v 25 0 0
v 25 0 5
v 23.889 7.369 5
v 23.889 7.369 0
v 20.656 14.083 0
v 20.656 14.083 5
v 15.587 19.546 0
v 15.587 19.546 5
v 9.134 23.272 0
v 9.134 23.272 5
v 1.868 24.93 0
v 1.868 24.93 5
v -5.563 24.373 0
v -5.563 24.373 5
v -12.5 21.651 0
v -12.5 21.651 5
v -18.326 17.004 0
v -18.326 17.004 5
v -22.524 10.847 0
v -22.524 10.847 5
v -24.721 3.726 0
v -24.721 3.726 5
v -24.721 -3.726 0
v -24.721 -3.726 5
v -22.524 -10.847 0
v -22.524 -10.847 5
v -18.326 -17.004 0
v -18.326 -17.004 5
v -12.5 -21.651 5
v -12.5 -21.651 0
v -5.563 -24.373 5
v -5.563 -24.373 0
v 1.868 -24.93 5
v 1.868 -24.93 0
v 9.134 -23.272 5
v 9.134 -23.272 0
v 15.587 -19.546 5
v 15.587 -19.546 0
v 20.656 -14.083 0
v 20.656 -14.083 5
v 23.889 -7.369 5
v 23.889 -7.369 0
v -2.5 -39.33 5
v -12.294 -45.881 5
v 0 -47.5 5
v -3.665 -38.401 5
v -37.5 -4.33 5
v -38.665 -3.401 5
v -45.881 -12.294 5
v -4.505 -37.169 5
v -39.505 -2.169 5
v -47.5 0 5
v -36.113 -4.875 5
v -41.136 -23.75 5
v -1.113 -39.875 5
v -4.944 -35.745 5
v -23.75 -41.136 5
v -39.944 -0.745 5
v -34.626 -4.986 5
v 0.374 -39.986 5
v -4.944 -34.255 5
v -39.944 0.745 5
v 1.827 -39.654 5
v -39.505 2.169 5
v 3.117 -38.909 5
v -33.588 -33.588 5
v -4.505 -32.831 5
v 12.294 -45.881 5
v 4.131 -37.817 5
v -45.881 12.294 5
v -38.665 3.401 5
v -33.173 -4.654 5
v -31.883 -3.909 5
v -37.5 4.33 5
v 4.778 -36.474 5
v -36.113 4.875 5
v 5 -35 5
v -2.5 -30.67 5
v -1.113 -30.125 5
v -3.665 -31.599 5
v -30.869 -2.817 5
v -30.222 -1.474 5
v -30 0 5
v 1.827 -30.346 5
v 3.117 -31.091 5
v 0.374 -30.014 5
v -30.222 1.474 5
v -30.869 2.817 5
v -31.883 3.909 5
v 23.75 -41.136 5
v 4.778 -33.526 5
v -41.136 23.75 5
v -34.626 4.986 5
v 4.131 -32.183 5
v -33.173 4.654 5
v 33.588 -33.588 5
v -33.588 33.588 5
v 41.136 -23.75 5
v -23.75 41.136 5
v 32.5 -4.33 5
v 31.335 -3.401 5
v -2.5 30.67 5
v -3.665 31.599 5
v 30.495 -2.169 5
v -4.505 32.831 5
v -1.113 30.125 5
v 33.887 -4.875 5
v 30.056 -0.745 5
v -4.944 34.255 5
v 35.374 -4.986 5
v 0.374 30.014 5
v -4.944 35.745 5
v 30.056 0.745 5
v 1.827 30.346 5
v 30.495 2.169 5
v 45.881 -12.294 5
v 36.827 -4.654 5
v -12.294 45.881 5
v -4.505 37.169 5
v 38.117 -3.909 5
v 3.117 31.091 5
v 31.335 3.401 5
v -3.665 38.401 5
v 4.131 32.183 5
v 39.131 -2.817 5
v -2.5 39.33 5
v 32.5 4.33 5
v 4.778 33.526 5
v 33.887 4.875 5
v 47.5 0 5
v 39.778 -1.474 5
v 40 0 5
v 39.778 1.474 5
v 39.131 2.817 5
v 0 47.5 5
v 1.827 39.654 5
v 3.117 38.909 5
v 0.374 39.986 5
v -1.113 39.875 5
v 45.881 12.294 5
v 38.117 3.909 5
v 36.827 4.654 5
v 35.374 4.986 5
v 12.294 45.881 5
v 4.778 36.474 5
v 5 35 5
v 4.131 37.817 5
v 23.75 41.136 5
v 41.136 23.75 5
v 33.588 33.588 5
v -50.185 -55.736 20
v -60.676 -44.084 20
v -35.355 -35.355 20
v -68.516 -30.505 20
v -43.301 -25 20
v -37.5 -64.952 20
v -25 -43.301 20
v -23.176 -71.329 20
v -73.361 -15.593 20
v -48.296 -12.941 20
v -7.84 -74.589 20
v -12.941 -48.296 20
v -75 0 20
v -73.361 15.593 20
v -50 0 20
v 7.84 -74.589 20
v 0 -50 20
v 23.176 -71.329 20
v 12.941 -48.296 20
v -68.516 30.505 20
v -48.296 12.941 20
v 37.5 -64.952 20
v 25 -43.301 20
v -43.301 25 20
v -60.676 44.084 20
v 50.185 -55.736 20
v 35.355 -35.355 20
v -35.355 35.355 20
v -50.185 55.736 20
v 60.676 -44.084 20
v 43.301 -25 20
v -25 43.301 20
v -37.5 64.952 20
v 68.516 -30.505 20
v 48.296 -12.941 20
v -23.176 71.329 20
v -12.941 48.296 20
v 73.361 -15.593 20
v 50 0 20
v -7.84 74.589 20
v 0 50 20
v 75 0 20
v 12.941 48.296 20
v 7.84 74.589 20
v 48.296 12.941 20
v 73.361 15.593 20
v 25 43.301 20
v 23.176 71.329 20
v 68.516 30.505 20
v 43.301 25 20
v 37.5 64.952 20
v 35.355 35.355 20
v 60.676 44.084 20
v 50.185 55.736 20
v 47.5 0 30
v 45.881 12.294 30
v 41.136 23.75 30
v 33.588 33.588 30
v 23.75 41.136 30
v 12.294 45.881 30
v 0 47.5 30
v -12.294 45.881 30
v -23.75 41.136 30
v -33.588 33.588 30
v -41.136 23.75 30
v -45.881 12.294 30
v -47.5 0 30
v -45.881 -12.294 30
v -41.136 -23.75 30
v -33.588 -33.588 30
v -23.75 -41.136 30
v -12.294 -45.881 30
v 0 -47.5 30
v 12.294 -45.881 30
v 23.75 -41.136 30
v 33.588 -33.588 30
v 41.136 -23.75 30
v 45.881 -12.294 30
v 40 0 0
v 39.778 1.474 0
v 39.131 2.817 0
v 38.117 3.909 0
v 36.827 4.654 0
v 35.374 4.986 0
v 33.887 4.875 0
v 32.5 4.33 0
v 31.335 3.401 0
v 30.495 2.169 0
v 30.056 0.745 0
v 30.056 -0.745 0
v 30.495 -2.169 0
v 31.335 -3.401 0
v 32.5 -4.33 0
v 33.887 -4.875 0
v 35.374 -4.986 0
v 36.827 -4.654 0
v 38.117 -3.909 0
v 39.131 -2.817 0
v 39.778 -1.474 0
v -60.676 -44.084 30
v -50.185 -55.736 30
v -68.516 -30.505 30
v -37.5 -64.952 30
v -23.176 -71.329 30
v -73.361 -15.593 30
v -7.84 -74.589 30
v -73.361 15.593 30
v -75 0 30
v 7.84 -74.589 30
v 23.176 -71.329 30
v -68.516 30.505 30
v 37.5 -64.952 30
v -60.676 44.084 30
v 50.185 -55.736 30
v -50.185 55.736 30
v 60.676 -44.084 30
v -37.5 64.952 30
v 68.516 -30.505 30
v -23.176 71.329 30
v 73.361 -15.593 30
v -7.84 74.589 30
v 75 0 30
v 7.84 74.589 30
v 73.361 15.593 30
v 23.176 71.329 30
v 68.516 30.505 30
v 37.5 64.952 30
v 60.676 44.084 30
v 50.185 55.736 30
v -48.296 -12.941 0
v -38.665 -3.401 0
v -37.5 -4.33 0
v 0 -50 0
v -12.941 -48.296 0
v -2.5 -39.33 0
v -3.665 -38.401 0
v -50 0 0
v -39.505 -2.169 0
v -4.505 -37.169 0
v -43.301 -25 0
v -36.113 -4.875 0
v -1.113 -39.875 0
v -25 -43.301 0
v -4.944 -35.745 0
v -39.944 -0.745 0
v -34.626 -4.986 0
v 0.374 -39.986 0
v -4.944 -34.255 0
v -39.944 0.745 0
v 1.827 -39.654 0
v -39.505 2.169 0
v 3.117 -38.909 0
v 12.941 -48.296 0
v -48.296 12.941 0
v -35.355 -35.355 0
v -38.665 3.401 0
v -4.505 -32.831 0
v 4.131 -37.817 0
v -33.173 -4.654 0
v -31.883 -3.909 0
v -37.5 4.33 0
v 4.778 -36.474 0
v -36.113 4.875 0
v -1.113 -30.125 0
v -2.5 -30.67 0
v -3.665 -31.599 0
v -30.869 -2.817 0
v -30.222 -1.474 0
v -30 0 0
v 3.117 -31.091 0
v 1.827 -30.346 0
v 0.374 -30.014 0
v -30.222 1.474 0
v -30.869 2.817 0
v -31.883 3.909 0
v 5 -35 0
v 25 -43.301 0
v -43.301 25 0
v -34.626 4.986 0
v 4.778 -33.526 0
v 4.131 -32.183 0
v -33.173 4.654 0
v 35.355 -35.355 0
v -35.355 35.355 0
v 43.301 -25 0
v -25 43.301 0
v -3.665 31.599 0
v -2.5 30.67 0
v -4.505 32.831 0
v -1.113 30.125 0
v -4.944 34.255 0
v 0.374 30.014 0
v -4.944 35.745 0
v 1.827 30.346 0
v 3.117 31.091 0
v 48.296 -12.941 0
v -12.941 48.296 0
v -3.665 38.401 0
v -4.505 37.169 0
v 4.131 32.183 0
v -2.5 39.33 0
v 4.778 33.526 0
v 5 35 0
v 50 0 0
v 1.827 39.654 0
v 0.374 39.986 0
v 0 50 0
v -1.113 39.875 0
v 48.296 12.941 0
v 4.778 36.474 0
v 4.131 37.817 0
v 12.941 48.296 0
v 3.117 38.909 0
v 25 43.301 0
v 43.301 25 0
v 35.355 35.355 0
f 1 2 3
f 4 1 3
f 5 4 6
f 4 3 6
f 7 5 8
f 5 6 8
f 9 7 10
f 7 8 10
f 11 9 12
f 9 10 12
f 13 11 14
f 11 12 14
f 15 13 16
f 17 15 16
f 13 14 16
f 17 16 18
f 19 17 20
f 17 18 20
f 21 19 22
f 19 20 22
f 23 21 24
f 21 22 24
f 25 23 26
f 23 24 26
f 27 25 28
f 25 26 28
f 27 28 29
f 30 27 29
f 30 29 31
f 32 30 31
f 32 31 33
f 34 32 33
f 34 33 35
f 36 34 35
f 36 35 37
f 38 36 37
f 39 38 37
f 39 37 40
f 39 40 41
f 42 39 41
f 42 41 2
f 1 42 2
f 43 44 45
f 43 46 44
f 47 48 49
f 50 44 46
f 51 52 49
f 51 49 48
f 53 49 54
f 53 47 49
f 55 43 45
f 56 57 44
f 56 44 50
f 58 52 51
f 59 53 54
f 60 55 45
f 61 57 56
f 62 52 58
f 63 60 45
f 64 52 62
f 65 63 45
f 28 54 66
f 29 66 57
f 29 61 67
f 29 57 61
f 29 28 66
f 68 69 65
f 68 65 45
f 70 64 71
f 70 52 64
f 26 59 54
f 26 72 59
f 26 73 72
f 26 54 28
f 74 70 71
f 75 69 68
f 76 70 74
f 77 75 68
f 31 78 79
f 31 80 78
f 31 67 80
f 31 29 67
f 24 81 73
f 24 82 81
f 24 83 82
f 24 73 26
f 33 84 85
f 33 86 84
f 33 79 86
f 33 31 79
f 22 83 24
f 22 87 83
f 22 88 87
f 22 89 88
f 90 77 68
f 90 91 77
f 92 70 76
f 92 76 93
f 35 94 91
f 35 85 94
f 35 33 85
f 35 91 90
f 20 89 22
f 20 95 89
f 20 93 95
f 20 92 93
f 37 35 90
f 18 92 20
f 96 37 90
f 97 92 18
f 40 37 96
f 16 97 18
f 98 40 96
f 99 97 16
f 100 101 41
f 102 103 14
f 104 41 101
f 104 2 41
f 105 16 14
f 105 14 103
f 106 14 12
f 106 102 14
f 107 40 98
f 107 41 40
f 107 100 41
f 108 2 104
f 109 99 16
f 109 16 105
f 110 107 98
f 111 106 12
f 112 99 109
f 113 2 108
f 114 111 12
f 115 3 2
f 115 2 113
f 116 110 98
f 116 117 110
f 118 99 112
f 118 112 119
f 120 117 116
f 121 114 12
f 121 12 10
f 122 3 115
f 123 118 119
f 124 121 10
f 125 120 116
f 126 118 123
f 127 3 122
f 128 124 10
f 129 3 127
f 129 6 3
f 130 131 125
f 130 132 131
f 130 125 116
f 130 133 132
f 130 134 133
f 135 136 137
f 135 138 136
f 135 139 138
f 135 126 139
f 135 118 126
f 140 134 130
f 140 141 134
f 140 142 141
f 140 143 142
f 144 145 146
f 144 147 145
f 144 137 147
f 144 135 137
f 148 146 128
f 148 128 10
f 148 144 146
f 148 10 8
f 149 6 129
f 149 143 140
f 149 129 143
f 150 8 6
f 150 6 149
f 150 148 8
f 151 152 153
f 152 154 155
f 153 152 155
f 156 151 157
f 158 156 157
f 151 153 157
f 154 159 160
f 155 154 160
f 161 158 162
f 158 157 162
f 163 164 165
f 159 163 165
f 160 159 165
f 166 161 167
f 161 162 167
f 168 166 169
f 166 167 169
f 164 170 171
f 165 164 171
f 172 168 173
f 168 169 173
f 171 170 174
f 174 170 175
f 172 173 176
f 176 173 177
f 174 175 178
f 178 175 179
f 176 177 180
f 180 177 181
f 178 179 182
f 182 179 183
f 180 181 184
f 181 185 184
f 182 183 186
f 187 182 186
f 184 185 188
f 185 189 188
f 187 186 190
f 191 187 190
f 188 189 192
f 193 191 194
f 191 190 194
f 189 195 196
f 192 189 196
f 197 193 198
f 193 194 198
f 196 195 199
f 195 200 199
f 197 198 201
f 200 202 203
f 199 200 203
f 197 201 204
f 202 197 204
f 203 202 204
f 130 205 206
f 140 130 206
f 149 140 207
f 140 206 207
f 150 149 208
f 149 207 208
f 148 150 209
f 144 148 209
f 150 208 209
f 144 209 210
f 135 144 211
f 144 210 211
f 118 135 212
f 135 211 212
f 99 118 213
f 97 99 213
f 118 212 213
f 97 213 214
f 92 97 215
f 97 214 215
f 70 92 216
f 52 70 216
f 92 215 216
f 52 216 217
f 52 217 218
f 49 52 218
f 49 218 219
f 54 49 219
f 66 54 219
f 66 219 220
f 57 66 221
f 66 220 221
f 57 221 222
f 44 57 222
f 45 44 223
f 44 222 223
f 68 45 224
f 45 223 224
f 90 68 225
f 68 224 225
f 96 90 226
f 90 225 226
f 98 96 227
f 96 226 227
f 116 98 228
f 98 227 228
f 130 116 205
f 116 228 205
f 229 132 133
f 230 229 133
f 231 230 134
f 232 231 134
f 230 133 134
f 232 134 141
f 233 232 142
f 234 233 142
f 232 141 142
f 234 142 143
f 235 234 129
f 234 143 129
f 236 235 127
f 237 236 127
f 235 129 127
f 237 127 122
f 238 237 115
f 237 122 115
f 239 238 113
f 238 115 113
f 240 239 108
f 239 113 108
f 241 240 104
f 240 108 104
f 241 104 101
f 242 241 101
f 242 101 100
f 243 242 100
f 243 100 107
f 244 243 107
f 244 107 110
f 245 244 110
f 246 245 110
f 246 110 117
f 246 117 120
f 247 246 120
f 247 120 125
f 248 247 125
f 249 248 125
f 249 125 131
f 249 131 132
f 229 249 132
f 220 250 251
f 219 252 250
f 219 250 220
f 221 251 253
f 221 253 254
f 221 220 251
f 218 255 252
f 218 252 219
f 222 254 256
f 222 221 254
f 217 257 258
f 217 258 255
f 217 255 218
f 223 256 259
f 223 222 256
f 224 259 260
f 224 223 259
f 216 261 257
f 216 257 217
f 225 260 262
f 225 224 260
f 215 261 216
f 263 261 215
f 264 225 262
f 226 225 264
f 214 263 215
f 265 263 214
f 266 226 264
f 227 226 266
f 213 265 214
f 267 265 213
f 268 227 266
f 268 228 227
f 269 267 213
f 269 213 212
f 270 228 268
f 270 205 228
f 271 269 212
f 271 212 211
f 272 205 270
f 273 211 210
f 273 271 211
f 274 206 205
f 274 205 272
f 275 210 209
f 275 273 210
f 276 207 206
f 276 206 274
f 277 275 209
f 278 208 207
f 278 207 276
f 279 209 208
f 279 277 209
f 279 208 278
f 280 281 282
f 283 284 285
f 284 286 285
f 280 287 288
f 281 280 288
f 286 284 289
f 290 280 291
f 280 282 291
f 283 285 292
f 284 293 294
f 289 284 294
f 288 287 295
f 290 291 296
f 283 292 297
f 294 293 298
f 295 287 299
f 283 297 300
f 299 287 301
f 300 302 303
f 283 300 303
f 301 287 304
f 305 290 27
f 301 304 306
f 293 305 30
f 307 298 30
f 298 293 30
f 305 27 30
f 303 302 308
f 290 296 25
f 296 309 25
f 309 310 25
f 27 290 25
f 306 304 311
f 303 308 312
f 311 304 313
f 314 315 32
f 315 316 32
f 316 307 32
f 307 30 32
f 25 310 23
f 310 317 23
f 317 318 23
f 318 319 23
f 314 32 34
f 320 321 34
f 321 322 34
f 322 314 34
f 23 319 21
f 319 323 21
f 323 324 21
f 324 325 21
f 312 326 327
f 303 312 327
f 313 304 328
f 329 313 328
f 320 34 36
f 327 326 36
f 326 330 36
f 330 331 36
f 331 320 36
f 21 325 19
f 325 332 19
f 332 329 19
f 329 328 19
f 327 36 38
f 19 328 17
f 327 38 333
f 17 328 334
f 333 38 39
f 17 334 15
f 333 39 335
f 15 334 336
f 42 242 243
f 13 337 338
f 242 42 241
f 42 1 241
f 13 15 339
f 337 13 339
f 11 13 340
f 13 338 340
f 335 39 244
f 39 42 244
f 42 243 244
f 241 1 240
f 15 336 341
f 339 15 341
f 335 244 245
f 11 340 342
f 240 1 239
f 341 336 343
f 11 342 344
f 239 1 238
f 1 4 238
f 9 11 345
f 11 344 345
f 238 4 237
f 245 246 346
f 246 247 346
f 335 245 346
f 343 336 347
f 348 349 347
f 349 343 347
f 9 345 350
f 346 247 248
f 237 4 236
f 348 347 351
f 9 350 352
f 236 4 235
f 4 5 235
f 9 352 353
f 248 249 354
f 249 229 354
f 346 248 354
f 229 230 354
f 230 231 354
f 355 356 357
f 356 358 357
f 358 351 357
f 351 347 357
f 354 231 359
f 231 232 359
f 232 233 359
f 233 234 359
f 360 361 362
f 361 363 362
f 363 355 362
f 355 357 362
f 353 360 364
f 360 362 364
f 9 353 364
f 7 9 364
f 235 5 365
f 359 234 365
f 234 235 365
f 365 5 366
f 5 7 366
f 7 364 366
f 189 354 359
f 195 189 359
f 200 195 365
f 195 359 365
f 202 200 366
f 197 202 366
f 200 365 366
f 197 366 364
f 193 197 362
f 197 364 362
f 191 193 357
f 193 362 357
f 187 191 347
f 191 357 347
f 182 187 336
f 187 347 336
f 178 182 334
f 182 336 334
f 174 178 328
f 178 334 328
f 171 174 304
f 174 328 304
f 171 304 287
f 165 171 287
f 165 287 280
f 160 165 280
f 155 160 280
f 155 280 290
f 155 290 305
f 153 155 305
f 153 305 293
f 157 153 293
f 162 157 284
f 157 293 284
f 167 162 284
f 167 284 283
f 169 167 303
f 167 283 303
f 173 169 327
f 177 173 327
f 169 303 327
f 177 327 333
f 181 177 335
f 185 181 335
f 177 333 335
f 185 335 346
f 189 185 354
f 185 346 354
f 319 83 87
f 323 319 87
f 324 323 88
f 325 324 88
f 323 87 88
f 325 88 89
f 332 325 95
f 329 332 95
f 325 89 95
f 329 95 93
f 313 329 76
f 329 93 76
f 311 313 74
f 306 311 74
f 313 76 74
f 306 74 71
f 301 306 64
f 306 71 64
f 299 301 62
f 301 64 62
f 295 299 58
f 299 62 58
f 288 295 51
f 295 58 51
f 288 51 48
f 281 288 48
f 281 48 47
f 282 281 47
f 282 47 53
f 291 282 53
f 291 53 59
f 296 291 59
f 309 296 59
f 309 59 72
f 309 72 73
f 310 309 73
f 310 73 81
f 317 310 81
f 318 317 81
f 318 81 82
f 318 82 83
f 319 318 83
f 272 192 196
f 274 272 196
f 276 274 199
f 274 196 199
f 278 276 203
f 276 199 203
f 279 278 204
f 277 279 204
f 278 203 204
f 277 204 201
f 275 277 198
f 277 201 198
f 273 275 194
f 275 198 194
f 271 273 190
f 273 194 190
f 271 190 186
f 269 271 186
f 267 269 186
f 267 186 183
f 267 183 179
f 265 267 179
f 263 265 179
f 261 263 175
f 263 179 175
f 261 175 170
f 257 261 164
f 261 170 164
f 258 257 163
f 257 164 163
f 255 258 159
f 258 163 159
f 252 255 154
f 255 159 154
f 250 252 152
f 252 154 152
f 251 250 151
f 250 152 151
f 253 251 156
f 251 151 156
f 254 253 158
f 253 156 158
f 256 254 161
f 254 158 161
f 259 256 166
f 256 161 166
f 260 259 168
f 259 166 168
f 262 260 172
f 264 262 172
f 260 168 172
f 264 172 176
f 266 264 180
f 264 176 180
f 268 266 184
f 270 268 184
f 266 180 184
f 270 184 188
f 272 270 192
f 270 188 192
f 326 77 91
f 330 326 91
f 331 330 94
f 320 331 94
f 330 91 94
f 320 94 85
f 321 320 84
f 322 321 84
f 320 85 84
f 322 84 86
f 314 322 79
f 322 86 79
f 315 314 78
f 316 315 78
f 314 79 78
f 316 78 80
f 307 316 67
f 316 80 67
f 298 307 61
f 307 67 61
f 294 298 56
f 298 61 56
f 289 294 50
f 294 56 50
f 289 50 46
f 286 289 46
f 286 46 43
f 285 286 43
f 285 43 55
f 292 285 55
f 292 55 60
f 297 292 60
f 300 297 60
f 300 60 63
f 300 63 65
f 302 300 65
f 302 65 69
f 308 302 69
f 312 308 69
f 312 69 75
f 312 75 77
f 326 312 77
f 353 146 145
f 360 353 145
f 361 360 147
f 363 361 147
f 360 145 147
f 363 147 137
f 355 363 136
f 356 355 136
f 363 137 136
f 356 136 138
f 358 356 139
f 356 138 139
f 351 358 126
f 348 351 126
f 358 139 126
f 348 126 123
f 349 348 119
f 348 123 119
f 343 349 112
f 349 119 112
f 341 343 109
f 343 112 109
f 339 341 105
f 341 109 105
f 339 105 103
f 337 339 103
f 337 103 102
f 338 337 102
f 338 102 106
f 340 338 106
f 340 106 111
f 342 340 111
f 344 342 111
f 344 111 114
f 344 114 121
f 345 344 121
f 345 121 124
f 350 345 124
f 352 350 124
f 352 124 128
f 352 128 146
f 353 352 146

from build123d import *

# Parameters (mm, degrees)
SKETCH1_R           = 50
BOSS_EXTRUDE1_DEPTH = 20
SKETCH3_R           = 75
BOSS_EXTRUDE2_DEPTH = 10
SKETCH4_R           = 47.5
CUT_EXTRUDE3_DEPTH  = 25
SKETCH5_R           = 25
CUT_EXTRUDE4_DEPTH  = 25
SKETCH6_R           = 5
CUT_EXTRUDE5_DEPTH  = 25


with BuildPart() as part:
    # Sketch1 → Boss-Extrude1 (new body)
    with BuildSketch(Plane.XY):
        Circle(SKETCH1_R)
    extrude(amount=BOSS_EXTRUDE1_DEPTH)

    # Sketch3 → Boss-Extrude2 (add)
    with BuildSketch(Plane.XY.offset(20)):
        Circle(SKETCH3_R)
    extrude(amount=BOSS_EXTRUDE2_DEPTH)

    # Sketch4 → Cut-Extrude3 (cut)
    with BuildSketch(Plane.XY.offset(30)):
        Circle(SKETCH4_R)
    extrude(amount=-CUT_EXTRUDE3_DEPTH, mode=Mode.SUBTRACT)

    # Sketch5 → Cut-Extrude4 (cut)
    with BuildSketch(Plane.XY.offset(5)):
        Circle(SKETCH5_R)
    extrude(amount=-CUT_EXTRUDE4_DEPTH, mode=Mode.SUBTRACT)

    # Sketch6 → Cut-Extrude5 (cut)
    with BuildSketch(Plane.XY.offset(5)):
        with Locations((0, 35)):
            Circle(SKETCH6_R)
        with Locations((35, 0)):
            Circle(SKETCH6_R)
        with Locations((0, -35)):
            Circle(SKETCH6_R)
        with Locations((-35, 0)):
            Circle(SKETCH6_R)
    extrude(amount=-CUT_EXTRUDE5_DEPTH, mode=Mode.SUBTRACT)


solid = part.part
